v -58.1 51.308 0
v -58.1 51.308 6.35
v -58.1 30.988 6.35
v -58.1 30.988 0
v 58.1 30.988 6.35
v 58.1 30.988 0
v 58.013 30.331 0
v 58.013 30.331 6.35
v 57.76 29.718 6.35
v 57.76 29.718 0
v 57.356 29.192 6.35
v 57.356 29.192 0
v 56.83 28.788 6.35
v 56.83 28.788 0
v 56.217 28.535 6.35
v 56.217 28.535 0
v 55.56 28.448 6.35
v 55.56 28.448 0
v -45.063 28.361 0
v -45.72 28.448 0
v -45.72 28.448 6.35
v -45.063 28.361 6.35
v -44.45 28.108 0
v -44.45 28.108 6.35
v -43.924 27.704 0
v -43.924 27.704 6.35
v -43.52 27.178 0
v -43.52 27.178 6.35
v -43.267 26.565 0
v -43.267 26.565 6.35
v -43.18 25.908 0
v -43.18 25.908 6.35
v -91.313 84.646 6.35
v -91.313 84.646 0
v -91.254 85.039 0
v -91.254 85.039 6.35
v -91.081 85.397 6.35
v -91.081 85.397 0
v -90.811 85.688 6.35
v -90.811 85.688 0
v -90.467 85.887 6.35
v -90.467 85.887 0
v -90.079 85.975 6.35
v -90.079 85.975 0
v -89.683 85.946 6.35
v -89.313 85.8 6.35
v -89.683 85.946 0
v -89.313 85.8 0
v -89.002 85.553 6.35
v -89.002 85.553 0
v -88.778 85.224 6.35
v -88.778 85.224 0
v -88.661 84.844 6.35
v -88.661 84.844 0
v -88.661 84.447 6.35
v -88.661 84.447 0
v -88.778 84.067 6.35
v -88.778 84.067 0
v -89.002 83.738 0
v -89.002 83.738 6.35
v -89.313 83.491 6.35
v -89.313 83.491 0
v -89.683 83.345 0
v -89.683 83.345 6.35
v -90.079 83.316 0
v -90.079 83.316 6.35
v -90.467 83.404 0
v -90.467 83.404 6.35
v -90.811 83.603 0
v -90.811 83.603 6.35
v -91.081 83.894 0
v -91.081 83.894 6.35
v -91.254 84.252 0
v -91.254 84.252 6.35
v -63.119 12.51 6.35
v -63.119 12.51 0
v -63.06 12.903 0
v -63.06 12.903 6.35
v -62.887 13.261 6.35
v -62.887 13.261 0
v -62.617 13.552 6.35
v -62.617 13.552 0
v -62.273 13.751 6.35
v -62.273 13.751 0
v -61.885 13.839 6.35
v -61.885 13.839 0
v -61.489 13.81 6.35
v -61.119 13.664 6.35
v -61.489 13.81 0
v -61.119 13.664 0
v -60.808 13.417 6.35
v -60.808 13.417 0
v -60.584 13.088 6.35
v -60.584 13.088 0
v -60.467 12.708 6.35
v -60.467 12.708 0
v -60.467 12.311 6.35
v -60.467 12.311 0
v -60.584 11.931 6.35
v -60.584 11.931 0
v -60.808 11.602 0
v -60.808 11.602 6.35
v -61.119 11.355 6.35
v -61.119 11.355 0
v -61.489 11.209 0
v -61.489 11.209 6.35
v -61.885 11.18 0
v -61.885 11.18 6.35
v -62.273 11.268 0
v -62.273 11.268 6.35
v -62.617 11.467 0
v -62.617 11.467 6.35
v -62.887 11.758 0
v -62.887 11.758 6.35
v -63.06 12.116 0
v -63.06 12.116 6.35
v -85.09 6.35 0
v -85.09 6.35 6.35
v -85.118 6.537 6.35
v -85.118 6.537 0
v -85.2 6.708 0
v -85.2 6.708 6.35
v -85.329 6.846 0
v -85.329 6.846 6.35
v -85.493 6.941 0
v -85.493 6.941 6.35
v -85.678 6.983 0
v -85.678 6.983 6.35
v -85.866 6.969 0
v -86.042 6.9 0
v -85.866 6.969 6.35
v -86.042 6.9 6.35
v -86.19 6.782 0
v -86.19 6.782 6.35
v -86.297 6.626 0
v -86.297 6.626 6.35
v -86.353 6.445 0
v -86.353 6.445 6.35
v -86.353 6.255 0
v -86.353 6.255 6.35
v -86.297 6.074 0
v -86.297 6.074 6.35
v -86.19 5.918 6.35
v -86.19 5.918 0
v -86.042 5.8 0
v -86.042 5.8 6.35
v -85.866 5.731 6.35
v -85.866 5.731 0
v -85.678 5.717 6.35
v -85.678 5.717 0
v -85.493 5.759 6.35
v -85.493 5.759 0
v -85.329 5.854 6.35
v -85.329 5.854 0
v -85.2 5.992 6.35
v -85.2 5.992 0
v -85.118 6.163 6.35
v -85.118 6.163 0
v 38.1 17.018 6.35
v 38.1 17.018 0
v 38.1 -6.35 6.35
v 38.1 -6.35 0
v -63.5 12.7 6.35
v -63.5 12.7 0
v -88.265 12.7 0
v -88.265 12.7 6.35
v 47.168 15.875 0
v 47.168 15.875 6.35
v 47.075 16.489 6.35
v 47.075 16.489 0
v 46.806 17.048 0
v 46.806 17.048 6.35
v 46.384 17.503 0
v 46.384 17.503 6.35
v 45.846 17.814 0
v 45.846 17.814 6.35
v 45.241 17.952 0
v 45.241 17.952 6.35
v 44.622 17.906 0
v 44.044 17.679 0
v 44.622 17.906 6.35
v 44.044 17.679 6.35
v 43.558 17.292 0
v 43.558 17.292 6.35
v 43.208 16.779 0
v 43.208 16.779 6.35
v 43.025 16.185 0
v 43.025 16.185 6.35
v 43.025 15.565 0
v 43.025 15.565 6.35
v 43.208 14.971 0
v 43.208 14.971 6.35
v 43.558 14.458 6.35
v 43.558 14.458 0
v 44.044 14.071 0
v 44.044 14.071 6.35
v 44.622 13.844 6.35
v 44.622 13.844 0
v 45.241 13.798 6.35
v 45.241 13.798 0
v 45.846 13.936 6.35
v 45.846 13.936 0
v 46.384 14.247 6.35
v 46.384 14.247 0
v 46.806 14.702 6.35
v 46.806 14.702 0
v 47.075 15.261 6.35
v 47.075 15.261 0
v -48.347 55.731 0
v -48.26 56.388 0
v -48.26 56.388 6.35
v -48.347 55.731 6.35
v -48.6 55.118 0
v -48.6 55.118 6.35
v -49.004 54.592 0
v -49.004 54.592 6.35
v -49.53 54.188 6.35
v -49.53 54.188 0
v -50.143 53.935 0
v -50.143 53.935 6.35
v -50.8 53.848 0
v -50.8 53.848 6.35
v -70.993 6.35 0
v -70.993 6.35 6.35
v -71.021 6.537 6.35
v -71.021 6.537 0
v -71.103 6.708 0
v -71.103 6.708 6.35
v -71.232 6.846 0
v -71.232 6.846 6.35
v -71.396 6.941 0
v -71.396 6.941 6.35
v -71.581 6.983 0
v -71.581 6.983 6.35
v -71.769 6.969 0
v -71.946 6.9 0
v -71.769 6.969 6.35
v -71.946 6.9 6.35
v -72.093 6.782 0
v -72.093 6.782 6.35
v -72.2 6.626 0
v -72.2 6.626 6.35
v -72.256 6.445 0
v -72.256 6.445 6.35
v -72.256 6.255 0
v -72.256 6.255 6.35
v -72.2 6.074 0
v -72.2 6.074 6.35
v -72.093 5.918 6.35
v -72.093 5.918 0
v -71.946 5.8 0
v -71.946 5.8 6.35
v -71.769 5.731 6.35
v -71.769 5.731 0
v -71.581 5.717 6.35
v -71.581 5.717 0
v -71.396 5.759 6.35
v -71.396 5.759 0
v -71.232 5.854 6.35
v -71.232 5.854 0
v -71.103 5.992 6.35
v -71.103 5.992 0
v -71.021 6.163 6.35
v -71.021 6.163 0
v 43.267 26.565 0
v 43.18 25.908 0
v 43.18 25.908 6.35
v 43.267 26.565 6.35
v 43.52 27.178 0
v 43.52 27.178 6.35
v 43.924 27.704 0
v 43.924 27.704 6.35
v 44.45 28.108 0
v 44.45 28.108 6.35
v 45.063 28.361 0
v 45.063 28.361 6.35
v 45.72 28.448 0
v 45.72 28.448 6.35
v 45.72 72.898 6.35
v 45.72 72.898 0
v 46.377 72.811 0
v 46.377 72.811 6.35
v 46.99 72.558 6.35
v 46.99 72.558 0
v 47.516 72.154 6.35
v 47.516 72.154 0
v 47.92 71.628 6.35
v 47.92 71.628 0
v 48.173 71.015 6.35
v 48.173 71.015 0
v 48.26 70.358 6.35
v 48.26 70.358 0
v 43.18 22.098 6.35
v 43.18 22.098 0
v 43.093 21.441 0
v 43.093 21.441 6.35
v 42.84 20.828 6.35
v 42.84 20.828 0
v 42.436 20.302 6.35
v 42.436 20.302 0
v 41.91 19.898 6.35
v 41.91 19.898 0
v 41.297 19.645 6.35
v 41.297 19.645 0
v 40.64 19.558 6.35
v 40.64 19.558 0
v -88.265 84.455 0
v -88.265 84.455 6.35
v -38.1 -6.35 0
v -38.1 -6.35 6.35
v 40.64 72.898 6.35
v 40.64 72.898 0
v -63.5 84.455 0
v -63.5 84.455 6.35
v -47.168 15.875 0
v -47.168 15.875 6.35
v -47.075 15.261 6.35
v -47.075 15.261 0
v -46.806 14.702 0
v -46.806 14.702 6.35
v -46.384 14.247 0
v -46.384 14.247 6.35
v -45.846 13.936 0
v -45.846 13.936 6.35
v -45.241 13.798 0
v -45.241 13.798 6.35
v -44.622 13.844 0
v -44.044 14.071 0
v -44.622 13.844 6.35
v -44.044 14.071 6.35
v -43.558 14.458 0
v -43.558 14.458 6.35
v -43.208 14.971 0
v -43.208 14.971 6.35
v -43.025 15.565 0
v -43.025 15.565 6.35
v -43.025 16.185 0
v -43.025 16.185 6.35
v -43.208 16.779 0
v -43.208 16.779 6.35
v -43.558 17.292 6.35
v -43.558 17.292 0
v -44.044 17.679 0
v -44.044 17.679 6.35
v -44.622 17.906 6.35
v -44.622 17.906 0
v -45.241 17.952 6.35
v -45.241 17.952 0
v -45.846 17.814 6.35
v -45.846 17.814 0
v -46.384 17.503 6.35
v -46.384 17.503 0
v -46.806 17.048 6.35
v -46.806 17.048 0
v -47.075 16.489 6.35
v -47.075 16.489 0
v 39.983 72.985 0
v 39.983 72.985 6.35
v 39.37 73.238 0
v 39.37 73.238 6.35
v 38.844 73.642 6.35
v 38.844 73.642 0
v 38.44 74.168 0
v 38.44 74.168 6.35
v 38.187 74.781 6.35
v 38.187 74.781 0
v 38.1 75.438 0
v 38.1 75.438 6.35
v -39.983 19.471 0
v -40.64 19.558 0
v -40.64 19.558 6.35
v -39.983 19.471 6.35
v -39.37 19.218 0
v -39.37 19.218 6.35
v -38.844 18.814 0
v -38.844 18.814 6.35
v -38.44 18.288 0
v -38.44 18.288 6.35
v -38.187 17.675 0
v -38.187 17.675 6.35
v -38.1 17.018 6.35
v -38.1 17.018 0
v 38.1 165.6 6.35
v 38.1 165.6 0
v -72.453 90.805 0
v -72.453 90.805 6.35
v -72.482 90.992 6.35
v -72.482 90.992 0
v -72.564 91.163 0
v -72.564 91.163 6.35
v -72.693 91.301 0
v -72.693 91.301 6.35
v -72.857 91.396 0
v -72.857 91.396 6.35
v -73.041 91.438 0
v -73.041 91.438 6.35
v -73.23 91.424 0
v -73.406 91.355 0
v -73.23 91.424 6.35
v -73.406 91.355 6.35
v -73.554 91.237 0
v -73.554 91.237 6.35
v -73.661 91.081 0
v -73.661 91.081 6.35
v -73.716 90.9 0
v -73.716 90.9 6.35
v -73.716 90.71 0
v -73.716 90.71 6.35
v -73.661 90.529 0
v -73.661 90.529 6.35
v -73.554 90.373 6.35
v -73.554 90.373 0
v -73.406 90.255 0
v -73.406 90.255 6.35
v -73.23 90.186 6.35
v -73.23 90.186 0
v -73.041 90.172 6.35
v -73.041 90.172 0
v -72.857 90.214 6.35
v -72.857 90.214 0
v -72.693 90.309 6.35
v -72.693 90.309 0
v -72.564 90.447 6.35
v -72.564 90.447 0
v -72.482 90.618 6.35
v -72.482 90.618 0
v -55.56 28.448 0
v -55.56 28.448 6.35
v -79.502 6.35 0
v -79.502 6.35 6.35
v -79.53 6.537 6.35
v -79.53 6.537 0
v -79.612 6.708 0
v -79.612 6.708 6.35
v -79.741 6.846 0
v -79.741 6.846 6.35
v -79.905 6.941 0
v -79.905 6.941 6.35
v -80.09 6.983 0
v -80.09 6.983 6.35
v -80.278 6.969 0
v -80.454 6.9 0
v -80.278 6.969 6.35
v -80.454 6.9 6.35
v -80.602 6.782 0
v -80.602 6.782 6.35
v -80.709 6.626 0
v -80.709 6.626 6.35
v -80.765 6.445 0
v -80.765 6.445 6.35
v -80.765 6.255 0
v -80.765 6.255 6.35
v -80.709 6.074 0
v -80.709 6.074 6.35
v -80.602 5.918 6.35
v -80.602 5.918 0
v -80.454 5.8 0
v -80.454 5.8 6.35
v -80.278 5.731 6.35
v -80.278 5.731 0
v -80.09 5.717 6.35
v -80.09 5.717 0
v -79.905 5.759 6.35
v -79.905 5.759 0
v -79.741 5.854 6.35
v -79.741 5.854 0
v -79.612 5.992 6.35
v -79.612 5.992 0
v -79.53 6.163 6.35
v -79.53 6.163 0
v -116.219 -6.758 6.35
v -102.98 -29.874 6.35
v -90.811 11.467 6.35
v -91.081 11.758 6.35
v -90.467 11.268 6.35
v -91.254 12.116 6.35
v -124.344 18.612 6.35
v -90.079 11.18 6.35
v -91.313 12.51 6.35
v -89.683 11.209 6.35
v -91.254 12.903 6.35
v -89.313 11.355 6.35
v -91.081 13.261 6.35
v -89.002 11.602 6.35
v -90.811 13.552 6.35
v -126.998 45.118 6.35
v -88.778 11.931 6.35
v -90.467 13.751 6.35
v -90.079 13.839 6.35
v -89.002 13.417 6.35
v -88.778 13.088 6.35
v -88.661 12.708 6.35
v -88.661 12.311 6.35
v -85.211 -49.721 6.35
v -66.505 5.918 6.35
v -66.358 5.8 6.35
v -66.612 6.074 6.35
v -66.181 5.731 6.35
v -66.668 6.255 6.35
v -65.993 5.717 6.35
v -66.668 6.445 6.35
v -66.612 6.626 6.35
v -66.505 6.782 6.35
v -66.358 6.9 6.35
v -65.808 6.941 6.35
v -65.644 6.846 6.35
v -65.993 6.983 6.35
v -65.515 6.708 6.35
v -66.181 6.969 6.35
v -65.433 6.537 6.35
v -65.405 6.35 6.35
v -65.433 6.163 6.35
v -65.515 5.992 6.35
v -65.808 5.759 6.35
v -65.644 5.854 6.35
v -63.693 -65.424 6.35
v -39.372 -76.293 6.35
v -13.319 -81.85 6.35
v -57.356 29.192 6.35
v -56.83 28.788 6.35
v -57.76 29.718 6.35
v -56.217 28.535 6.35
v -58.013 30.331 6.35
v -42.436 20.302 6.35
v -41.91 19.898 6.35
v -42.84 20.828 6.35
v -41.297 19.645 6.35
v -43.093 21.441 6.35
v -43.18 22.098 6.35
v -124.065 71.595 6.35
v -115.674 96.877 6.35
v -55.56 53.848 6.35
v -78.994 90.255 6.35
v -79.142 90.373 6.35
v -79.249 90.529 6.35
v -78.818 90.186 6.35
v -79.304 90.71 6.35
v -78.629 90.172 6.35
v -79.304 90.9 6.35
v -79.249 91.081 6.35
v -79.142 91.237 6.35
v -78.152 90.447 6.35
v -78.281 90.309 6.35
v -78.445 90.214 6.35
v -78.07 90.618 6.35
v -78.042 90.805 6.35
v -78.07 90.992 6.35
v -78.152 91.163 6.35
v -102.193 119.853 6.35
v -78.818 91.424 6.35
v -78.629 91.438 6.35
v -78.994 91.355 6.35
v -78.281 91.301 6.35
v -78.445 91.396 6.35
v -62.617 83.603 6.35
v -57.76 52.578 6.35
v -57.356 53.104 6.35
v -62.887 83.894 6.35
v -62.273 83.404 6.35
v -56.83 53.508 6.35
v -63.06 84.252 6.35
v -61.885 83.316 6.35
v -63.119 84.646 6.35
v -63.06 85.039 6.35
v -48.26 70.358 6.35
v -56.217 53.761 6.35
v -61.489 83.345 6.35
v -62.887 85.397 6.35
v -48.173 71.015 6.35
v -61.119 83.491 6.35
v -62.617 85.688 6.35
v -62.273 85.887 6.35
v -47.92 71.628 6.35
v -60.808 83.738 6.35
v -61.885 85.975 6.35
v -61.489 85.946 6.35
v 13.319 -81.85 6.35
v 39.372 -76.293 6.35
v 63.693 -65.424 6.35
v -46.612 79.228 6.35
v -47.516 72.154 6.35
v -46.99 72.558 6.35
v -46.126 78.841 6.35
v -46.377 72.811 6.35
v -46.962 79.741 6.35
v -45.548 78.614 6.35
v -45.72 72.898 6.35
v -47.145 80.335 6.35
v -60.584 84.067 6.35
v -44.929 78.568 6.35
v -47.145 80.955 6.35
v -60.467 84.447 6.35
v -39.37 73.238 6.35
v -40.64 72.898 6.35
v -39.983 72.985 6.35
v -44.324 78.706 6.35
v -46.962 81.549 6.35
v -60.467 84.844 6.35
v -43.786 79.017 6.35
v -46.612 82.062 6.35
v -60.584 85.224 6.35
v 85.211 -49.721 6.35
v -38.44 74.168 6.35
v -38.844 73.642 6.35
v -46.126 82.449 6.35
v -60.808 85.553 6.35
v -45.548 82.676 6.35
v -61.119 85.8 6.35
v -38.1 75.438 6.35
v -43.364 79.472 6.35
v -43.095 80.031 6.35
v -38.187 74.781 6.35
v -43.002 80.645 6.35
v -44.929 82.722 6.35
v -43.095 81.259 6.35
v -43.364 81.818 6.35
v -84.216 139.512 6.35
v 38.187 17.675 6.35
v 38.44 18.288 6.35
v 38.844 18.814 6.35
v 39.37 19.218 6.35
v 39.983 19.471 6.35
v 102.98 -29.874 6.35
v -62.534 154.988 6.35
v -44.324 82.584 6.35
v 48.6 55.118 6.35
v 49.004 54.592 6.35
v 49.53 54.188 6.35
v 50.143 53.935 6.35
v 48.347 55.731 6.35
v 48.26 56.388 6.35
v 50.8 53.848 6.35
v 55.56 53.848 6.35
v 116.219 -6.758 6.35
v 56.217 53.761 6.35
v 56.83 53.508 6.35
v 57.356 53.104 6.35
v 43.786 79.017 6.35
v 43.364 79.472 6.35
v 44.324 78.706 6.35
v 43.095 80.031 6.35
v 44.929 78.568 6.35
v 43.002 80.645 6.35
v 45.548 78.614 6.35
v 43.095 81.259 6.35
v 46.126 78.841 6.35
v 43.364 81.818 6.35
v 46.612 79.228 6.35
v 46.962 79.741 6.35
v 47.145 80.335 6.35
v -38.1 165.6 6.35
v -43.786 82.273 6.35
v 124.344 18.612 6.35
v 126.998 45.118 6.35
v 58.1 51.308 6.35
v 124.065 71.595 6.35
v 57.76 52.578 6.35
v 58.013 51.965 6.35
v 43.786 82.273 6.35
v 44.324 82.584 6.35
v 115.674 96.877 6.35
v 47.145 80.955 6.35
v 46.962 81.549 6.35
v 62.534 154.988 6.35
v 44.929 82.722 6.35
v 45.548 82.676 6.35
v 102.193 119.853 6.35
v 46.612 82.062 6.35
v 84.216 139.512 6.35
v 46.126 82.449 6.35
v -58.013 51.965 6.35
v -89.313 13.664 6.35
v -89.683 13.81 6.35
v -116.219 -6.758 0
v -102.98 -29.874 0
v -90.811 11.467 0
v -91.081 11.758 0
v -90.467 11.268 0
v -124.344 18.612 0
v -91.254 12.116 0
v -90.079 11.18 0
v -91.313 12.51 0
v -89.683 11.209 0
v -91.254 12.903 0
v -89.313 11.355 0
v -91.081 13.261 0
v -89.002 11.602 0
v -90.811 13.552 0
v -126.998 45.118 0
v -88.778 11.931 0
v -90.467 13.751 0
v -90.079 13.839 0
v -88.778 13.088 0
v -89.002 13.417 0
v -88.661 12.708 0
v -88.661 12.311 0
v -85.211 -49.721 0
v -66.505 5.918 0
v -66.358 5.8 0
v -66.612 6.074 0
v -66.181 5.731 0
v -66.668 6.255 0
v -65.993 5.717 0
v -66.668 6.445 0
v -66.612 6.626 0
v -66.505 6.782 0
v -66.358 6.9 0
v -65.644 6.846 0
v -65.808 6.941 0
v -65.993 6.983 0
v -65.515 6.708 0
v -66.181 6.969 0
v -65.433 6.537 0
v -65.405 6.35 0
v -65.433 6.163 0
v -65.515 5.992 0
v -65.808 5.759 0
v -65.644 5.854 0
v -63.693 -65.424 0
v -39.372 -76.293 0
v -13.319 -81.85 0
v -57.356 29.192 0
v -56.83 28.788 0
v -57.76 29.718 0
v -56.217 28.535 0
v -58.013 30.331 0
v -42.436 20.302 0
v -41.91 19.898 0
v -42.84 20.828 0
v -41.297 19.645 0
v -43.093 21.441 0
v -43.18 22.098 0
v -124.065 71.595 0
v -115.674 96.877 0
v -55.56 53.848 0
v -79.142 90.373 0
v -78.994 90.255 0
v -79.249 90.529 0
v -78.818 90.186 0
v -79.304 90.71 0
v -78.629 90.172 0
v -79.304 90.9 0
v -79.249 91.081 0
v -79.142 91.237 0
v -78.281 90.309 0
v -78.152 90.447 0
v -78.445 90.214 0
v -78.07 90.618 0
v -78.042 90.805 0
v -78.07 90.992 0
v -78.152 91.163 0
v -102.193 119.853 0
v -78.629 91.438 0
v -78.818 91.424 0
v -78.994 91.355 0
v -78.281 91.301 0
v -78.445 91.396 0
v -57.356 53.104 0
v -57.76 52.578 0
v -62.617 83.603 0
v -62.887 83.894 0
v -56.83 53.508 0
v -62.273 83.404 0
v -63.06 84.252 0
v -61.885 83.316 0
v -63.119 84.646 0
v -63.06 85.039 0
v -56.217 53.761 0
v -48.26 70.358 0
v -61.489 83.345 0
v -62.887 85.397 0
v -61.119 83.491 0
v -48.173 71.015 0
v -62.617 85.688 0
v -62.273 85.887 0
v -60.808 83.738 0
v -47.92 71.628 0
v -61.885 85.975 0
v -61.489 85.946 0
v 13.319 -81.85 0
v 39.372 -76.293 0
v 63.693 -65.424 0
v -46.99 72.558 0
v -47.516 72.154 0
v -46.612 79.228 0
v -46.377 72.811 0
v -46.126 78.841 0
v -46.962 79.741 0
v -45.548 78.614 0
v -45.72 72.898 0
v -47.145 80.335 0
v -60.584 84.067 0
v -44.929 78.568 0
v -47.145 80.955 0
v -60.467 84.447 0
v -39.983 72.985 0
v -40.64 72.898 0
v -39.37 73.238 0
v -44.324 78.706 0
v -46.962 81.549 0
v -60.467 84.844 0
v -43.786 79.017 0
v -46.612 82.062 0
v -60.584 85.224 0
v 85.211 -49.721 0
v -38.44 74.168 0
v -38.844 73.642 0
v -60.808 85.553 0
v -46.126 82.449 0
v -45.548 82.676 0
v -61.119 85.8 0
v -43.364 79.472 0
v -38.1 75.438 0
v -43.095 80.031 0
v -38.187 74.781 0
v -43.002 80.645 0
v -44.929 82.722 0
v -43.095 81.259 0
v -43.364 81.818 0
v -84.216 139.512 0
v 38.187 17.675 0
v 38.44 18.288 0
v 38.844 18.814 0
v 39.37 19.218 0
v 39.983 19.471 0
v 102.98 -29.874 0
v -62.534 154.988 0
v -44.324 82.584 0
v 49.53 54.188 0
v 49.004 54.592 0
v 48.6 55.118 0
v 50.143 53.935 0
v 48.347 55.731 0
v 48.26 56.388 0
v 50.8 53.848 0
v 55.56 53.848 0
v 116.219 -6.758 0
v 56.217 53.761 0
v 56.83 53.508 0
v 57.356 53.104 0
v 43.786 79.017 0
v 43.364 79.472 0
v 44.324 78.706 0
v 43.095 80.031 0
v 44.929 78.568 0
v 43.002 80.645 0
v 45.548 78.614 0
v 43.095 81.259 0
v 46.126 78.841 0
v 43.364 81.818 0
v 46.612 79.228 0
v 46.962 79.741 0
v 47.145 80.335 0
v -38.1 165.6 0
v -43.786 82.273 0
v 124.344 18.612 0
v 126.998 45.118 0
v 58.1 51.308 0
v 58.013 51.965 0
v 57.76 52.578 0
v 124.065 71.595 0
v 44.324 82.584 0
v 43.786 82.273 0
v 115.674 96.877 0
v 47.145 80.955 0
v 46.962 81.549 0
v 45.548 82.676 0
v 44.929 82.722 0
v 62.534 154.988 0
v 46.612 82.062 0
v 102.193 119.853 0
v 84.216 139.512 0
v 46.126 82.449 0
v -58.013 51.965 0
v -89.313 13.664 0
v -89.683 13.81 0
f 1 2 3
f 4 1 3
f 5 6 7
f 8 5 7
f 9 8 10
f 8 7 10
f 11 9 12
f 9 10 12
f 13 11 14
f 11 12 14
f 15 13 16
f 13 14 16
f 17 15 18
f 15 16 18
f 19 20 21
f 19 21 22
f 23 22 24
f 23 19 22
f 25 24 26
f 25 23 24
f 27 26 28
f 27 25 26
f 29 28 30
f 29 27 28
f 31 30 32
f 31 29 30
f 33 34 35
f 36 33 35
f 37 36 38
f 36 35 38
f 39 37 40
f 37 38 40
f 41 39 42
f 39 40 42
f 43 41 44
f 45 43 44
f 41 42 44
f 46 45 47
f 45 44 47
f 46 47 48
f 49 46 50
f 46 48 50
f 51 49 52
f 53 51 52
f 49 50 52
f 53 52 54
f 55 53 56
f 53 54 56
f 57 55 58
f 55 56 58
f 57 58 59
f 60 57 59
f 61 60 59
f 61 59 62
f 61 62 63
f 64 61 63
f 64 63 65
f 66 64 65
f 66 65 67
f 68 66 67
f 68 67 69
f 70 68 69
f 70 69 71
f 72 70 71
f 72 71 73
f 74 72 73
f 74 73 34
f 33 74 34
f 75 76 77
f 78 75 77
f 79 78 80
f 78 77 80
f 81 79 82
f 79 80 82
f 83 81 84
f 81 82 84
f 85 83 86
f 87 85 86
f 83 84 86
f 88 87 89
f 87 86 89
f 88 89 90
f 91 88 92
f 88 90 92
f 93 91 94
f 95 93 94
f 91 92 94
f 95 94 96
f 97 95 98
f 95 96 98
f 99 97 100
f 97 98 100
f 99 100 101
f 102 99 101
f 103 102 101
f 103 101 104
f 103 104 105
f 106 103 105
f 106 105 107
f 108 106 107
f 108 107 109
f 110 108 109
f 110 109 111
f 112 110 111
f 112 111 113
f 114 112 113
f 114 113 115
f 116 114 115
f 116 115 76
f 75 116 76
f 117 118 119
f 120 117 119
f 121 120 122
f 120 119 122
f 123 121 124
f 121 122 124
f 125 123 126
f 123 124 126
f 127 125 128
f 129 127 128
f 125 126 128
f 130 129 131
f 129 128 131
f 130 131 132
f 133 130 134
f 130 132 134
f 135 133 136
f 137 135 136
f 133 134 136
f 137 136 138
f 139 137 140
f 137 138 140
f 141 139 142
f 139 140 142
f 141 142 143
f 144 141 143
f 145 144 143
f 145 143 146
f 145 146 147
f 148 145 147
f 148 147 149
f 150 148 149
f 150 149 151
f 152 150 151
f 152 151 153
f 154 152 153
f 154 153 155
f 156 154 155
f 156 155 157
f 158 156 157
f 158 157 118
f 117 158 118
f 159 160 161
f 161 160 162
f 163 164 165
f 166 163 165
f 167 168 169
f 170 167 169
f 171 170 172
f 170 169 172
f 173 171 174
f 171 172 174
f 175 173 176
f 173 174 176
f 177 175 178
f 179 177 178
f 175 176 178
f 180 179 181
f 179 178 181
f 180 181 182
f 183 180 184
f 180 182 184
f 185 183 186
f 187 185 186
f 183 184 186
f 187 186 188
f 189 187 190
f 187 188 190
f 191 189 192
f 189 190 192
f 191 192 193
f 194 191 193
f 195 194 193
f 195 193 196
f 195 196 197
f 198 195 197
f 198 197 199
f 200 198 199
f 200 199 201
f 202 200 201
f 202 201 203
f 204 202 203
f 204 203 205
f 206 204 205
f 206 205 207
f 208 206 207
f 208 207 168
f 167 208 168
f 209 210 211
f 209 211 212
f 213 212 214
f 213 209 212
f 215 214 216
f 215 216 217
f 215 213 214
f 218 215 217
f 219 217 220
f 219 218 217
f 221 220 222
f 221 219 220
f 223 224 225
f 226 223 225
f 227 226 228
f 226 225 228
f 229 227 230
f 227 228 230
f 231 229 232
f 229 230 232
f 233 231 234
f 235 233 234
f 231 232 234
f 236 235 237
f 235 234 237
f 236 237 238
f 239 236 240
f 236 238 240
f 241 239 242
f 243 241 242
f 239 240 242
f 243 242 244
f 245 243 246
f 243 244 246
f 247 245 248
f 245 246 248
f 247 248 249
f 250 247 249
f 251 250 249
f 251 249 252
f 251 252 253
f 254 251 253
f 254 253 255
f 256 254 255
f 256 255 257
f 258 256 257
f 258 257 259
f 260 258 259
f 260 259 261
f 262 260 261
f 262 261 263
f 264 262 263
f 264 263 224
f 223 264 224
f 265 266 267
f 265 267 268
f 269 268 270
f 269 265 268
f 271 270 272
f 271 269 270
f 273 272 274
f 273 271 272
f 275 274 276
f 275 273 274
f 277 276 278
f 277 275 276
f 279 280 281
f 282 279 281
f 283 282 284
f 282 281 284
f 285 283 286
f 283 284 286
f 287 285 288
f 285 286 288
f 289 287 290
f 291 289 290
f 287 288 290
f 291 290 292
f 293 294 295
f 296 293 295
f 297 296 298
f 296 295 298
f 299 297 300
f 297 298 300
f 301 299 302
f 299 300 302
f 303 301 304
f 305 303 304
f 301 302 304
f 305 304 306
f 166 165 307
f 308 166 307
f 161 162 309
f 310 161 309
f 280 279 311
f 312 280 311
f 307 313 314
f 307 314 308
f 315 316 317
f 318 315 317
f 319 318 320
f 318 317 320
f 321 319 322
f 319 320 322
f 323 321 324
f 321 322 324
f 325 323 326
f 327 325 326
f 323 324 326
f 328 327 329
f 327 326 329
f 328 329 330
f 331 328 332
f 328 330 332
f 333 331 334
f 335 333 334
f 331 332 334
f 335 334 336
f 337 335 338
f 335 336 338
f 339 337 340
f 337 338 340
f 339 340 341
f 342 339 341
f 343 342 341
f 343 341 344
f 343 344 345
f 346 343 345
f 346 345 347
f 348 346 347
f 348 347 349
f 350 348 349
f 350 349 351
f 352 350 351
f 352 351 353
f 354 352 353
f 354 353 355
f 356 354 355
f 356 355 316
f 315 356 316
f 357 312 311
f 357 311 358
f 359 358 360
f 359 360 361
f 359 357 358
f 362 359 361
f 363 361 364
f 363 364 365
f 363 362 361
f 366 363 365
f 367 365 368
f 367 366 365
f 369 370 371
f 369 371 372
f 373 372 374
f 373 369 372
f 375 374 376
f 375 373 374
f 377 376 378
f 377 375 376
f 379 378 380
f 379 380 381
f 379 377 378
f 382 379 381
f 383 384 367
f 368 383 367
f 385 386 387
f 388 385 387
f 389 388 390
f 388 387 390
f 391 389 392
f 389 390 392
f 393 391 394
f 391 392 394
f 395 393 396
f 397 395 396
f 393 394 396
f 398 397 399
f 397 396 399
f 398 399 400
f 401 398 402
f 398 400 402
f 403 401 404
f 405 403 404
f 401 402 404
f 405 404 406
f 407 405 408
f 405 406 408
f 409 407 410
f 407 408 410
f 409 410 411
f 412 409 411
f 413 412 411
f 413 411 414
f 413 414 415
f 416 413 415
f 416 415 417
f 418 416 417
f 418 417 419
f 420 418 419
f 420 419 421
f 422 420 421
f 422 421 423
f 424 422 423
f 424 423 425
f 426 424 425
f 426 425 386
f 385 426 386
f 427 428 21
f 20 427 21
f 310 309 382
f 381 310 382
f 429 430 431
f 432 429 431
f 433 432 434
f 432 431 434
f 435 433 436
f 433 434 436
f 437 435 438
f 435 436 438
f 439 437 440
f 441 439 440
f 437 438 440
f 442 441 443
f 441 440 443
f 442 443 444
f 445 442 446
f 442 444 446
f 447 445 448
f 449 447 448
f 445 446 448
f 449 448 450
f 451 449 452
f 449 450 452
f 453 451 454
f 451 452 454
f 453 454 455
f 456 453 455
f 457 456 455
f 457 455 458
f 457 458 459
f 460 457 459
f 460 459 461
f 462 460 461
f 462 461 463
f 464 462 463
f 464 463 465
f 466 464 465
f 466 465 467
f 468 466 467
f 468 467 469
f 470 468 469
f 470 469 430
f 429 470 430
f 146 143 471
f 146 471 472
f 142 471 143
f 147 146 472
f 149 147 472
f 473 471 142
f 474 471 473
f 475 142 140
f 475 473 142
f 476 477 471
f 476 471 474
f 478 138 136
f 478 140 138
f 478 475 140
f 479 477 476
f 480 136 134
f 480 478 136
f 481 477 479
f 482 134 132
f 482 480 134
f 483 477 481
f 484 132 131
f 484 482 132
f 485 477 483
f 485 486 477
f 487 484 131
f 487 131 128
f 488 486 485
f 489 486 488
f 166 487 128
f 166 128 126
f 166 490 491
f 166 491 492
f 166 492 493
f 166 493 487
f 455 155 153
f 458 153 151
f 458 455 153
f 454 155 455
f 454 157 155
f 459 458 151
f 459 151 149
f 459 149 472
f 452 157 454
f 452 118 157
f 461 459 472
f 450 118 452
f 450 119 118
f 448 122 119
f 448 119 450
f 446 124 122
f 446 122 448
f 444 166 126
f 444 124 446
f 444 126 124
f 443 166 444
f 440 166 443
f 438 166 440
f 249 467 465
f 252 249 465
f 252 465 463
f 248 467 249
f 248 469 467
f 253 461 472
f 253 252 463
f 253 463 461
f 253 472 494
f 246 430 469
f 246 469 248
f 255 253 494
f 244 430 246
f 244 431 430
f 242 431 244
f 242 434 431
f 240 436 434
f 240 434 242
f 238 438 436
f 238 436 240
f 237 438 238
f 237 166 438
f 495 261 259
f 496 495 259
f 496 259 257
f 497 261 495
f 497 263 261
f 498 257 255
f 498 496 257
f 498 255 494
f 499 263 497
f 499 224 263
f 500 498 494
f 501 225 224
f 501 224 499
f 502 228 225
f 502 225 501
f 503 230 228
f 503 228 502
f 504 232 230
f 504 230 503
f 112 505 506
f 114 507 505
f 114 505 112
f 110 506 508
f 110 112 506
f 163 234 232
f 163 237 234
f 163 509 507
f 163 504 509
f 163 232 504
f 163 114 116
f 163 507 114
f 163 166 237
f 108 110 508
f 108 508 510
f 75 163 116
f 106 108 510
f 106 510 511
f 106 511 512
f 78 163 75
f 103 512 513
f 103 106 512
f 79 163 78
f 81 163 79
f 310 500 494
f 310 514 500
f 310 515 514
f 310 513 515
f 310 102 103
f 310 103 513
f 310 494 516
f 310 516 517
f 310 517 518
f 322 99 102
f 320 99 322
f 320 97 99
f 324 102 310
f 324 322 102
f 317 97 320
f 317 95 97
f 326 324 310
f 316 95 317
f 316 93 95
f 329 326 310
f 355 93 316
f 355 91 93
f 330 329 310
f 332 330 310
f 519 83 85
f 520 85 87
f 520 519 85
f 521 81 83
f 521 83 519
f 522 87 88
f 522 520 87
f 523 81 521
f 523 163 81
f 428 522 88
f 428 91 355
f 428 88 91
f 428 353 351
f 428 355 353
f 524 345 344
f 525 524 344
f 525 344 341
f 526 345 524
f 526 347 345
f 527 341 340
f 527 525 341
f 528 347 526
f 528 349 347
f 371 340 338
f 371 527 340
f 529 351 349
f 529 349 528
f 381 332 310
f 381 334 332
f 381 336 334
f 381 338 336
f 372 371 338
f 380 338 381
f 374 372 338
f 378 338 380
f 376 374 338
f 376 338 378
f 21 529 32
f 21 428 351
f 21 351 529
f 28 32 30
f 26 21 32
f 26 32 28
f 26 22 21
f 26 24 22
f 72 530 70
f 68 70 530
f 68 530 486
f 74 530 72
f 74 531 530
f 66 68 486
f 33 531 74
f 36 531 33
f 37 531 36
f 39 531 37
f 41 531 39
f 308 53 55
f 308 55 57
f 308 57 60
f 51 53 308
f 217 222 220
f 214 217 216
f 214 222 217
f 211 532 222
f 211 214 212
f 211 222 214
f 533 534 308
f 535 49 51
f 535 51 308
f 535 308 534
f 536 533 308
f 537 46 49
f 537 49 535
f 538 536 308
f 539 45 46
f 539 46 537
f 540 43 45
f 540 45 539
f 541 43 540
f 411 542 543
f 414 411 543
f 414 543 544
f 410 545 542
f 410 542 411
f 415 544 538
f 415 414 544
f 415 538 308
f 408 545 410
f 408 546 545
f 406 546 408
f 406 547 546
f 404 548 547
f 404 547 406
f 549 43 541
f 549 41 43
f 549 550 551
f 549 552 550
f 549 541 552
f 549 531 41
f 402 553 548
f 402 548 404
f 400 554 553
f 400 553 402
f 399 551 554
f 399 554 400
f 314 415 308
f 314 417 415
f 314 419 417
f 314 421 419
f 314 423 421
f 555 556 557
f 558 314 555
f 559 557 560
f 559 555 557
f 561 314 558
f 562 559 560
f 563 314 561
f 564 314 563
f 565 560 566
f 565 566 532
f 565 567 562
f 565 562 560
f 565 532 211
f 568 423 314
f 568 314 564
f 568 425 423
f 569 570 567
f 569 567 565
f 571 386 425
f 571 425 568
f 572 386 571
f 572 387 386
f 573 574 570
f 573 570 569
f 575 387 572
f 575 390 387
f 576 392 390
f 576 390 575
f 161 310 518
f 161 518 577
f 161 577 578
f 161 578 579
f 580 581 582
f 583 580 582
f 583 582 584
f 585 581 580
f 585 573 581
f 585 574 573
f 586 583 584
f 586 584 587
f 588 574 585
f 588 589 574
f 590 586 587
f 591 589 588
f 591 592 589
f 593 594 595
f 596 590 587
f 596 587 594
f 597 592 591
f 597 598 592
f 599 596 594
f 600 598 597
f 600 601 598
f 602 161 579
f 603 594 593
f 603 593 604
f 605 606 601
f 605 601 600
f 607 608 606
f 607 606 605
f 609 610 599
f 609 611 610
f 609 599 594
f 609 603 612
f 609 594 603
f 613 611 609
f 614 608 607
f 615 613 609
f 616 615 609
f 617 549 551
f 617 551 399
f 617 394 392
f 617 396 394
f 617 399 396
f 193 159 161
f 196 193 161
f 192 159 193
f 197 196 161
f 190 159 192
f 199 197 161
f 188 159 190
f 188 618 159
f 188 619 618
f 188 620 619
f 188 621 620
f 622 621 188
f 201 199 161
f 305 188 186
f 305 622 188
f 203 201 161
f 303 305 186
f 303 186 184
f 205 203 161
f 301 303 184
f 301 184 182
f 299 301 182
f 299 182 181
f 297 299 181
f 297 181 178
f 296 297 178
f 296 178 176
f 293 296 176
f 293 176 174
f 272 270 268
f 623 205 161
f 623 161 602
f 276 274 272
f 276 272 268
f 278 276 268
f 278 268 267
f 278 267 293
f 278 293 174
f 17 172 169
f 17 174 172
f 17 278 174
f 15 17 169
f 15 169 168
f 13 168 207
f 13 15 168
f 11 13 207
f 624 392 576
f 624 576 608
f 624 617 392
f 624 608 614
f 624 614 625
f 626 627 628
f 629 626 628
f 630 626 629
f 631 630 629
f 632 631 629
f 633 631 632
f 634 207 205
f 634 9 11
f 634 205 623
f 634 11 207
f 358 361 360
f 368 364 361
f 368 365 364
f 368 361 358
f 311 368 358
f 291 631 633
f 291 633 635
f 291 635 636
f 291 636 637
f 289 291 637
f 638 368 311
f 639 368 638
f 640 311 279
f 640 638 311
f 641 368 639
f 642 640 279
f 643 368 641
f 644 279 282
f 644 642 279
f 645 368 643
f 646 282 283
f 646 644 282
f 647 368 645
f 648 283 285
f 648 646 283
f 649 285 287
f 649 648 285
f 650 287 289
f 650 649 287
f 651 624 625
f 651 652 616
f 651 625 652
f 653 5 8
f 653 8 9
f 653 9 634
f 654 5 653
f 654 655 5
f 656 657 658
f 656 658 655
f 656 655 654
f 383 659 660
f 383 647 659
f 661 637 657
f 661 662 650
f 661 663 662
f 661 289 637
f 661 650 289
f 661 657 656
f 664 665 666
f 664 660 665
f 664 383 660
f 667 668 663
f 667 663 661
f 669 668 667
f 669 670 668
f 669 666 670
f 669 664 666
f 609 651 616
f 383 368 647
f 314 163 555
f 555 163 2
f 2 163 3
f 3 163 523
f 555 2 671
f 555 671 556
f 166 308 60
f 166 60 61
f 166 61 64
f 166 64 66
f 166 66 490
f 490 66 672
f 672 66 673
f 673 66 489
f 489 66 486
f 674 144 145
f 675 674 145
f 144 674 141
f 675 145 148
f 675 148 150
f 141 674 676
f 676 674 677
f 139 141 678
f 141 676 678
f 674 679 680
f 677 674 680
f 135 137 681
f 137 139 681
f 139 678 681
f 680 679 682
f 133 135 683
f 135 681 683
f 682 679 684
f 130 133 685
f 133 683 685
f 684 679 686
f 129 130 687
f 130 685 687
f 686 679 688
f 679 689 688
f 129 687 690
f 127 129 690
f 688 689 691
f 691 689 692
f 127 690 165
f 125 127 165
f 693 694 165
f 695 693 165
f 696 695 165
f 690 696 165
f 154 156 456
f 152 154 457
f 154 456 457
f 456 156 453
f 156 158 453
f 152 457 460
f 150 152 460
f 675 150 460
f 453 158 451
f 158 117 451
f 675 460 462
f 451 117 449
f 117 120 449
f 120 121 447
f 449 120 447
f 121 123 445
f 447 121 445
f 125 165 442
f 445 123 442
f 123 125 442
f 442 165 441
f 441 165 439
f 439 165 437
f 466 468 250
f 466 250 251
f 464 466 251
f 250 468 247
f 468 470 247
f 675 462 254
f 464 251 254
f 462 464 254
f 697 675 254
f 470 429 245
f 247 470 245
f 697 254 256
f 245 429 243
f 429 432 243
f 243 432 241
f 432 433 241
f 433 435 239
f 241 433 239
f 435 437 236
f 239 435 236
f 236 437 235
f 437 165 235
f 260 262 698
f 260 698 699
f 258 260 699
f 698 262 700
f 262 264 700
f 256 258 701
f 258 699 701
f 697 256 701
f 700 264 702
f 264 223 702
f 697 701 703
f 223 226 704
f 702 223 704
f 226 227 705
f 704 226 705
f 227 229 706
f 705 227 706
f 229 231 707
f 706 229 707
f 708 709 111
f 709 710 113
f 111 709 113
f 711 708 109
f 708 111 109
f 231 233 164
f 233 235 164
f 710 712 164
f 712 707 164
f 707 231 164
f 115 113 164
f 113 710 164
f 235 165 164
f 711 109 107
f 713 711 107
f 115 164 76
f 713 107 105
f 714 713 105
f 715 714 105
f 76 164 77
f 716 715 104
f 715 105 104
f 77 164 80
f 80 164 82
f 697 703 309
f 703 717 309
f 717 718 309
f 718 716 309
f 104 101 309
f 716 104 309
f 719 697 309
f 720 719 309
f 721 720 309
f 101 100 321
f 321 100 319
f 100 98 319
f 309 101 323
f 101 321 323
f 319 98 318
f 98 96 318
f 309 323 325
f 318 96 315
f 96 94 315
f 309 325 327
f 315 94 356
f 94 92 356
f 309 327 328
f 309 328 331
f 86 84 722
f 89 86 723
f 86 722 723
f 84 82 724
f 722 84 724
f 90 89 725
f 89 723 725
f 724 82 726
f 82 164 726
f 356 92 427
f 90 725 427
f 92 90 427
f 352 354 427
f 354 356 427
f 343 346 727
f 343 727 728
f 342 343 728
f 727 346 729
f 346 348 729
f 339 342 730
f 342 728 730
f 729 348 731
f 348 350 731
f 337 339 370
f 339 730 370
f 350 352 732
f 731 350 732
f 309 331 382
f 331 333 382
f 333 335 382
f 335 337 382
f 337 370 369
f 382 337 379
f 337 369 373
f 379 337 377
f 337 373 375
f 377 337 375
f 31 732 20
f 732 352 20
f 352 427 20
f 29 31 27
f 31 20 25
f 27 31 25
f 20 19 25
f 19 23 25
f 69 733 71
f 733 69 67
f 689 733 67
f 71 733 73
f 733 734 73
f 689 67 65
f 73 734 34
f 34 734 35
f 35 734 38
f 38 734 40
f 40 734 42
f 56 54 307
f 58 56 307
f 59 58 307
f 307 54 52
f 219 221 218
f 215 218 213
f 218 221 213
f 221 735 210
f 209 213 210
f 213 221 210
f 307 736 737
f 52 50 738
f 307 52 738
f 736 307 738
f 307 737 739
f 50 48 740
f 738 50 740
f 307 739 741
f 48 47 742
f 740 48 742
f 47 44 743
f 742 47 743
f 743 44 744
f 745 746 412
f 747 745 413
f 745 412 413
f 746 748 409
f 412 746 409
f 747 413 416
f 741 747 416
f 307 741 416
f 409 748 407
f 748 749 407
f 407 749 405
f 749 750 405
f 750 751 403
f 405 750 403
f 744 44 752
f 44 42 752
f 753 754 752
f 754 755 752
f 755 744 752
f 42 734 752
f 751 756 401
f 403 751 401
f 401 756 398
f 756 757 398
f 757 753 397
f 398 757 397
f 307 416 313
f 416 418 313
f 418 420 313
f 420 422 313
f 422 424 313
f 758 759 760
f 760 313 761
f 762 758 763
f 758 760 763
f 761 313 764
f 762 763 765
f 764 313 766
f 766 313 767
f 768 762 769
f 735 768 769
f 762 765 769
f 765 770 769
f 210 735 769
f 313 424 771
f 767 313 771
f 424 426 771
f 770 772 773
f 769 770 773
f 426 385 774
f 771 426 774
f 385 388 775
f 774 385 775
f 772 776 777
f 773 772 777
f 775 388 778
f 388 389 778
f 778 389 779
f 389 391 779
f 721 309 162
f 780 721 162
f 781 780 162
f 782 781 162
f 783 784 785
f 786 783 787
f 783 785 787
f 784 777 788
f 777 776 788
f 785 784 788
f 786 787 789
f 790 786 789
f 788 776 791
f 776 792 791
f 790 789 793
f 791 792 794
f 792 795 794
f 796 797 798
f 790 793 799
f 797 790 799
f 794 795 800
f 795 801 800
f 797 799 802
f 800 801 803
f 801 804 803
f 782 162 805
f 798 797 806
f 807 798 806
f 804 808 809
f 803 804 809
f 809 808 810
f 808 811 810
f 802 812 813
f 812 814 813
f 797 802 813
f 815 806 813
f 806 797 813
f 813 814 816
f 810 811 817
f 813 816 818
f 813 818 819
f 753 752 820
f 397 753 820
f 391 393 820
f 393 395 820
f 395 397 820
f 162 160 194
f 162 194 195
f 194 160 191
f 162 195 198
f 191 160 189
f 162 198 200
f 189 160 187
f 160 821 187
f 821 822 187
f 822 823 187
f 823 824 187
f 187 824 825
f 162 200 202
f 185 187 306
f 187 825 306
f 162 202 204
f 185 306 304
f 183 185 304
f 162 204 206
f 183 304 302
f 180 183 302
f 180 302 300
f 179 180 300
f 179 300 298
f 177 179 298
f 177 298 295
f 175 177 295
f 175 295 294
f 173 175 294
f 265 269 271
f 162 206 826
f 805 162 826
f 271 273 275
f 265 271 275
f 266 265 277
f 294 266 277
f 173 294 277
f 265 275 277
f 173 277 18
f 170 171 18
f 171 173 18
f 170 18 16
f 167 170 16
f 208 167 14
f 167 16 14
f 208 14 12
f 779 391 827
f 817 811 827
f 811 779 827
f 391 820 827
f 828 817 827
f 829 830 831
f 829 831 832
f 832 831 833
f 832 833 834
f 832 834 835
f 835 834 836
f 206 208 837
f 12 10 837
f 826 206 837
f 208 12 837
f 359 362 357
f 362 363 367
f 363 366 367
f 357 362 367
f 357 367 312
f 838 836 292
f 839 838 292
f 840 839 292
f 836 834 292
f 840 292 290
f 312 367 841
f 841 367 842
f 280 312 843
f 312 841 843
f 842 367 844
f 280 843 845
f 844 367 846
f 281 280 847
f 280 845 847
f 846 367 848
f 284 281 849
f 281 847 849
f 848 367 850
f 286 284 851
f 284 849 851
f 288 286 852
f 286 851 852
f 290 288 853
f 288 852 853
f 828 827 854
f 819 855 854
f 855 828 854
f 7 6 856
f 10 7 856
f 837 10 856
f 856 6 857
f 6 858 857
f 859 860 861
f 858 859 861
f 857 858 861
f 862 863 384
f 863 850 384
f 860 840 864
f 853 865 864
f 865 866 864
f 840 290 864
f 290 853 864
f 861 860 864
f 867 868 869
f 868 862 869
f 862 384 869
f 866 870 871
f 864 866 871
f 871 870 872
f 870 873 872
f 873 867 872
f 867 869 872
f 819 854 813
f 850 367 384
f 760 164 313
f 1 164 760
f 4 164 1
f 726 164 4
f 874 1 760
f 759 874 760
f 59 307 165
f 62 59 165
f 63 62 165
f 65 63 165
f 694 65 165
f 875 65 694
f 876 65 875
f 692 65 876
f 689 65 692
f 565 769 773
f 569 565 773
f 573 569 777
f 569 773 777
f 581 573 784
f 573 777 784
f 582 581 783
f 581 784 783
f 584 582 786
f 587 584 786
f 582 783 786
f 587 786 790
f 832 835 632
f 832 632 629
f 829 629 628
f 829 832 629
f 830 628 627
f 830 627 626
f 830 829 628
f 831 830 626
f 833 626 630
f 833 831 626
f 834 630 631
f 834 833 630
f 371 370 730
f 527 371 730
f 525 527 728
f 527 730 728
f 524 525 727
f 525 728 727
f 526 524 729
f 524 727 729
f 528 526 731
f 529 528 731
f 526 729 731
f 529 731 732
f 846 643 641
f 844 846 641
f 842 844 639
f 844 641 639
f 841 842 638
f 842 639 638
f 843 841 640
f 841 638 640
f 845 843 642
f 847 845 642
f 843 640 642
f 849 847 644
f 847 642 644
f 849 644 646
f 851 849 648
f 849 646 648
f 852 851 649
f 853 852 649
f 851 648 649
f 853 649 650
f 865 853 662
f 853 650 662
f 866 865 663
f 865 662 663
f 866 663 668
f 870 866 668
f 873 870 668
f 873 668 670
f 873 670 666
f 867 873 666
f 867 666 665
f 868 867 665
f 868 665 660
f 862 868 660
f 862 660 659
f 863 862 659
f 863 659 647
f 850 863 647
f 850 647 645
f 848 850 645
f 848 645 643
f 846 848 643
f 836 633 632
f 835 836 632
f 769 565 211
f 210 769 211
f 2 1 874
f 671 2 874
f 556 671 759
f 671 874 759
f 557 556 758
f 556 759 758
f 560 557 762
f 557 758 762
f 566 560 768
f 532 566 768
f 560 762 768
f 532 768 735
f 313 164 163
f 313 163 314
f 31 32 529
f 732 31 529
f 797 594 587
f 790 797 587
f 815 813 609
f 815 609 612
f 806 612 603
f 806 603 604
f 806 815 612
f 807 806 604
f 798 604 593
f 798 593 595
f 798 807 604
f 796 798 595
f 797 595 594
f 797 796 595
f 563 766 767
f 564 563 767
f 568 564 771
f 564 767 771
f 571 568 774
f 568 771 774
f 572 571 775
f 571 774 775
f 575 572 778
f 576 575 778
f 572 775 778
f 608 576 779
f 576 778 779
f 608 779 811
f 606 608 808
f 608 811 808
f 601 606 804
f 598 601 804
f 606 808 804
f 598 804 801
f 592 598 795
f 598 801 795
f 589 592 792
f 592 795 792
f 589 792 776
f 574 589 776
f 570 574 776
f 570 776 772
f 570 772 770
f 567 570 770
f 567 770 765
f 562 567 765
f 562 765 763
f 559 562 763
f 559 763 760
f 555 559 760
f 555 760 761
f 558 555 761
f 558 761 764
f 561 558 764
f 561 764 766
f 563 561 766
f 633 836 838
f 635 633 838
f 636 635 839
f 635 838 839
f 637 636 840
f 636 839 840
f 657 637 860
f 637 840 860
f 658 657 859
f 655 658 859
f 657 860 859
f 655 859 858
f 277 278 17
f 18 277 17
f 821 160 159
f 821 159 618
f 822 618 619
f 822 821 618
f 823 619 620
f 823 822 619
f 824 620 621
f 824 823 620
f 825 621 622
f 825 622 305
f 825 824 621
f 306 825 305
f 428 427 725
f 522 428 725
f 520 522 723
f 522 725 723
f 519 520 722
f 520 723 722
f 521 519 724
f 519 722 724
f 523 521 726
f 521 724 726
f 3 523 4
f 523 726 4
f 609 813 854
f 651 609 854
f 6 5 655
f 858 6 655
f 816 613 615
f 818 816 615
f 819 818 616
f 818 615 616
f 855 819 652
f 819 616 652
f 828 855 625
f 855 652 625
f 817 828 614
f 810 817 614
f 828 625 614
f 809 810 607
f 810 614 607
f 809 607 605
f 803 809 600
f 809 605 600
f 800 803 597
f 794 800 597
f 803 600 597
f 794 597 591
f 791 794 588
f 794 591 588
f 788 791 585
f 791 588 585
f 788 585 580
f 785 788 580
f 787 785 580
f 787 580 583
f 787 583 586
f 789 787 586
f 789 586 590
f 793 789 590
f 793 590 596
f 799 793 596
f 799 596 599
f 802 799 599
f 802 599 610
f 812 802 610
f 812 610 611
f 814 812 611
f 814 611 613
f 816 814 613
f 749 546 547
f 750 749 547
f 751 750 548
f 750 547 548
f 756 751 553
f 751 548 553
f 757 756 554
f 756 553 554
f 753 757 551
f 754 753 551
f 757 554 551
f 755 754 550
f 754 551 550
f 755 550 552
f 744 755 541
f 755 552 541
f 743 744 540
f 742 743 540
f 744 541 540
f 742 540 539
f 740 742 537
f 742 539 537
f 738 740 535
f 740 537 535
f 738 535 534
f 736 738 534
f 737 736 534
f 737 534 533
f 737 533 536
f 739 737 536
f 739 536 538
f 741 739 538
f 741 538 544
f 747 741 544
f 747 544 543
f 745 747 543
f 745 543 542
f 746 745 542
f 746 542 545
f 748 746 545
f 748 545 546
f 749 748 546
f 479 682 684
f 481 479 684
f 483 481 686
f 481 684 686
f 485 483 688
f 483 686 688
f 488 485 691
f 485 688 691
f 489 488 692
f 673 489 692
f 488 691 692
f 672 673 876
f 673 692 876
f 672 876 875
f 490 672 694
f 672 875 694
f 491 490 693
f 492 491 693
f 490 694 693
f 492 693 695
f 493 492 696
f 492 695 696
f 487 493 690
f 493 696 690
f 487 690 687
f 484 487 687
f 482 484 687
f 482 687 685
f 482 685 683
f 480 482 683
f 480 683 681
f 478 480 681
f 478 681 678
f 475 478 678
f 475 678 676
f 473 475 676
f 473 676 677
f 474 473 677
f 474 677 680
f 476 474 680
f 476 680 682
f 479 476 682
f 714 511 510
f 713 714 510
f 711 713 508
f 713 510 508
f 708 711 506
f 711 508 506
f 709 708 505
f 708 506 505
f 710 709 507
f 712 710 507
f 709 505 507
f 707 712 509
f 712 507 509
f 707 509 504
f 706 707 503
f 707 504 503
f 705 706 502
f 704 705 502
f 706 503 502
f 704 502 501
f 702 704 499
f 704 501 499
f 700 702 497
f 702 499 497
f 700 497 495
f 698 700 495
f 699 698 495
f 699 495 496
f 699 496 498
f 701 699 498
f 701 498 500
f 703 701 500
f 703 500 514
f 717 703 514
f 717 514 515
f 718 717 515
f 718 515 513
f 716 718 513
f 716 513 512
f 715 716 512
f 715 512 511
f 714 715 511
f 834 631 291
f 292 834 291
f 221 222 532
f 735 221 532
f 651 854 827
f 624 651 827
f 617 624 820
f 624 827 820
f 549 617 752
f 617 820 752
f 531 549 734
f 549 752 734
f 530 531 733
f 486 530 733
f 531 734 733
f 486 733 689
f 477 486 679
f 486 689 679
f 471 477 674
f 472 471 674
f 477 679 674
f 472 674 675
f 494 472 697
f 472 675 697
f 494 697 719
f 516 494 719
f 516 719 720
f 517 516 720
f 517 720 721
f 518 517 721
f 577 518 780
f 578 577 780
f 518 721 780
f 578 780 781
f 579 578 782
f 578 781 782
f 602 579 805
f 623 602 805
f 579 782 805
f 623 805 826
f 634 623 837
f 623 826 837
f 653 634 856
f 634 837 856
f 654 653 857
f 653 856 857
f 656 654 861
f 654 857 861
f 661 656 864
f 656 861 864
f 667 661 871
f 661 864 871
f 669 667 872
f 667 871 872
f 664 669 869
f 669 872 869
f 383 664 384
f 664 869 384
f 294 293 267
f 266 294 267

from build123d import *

# Parameters (mm, degrees)
BOSS_EXTRUDE1_DEPTH = 6.35
CUT_EXTRUDE1_REACH  = 210.789
SKETCH2_R           = 1.3335
SKETCH2_W           = 24.765
SKETCH2_H           = 71.755
CUT_EXTRUDE2_REACH  = 210.789
SKETCH3_R           = 0.635
CUT_EXTRUDE3_DEPTH  = 209.788828163
FILLET1_START       = -1
FILLET1_DEPTH       = 8
FILLET1_2_DEPTH     = 6.35
SKETCH5_R           = 2.0828
CUT_EXTRUDE4_DEPTH  = 209.788828163


with BuildPart() as part:
    # Sketch1 → Boss-Extrude1 (new body)
    with BuildSketch(Plane.XY):
        with BuildLine():
            Line((-38.1, 92.71), (-38.1, 165.60027858))
            ThreePointArc((-38.1, 165.60027858), (0, -82.55), (38.1, 165.60027858))
            Line((38.1, 165.60027858), (38.1, 92.71))
            Line((38.1, 92.71), (38.1, -6.35))
            Line((38.1, -6.35), (-38.1, -6.35))
            Line((-38.1, -6.35), (-38.1, 92.71))
        make_face()
    extrude(amount=BOSS_EXTRUDE1_DEPTH)

    # Sketch2 → Cut-Extrude1 (cut, up to next)
    with BuildSketch(Plane(origin=(0, 0, 0), x_dir=(-1, 0, 0), z_dir=(0, 0, -1)), mode=Mode.PRIVATE) as cut_extrude1_sk1:
        with Locations((61.7855, 12.5095)):
            Circle(SKETCH2_R)
    cut_extrude1_tool1 = extrude(cut_extrude1_sk1.sketch, amount=-CUT_EXTRUDE1_REACH, mode=Mode.PRIVATE) & part.part
    # Sketch2 → Cut-Extrude1 (cut, up to next)
    with BuildSketch(Plane(origin=(0, 0, 0), x_dir=(-1, 0, 0), z_dir=(0, 0, -1)), mode=Mode.PRIVATE) as cut_extrude1_sk2:
        with Locations((61.7855, 84.6455)):
            Circle(SKETCH2_R)
    cut_extrude1_tool2 = extrude(cut_extrude1_sk2.sketch, amount=-CUT_EXTRUDE1_REACH, mode=Mode.PRIVATE) & part.part
    # Sketch2 → Cut-Extrude1 (cut, up to next)
    with BuildSketch(Plane(origin=(0, 0, 0), x_dir=(-1, 0, 0), z_dir=(0, 0, -1)), mode=Mode.PRIVATE) as cut_extrude1_sk3:
        with Locations((89.9795, 84.6455)):
            Circle(SKETCH2_R)
    cut_extrude1_tool3 = extrude(cut_extrude1_sk3.sketch, amount=-CUT_EXTRUDE1_REACH, mode=Mode.PRIVATE) & part.part
    # Sketch2 → Cut-Extrude1 (cut, up to next)
    with BuildSketch(Plane(origin=(0, 0, 0), x_dir=(-1, 0, 0), z_dir=(0, 0, -1)), mode=Mode.PRIVATE) as cut_extrude1_sk4:
        with Locations((89.9795, 12.5095)):
            Circle(SKETCH2_R)
    cut_extrude1_tool4 = extrude(cut_extrude1_sk4.sketch, amount=-CUT_EXTRUDE1_REACH, mode=Mode.PRIVATE) & part.part
    # Sketch2 → Cut-Extrude1 (cut, up to next)
    with BuildSketch(Plane(origin=(0, 0, 0), x_dir=(-1, 0, 0), z_dir=(0, 0, -1)), mode=Mode.PRIVATE) as cut_extrude1_sk5:
        with Locations((75.8825, 48.5775)):
            Rectangle(SKETCH2_W, SKETCH2_H)
    cut_extrude1_tool5 = extrude(cut_extrude1_sk5.sketch, amount=-CUT_EXTRUDE1_REACH, mode=Mode.PRIVATE) & part.part
    add(cut_extrude1_tool1.solids().sort_by_distance((-61.7855, 12.5095, 0))[0], mode=Mode.SUBTRACT)
    add(cut_extrude1_tool2.solids().sort_by_distance((-61.7855, 84.6455, 0))[0], mode=Mode.SUBTRACT)
    add(cut_extrude1_tool3.solids().sort_by_distance((-89.9795, 84.6455, 0))[0], mode=Mode.SUBTRACT)
    add(cut_extrude1_tool4.solids().sort_by_distance((-89.9795, 12.5095, 0))[0], mode=Mode.SUBTRACT)
    add(cut_extrude1_tool5.solids().sort_by_distance((-75.8825, 48.5775, 0))[0], mode=Mode.SUBTRACT)

    # Sketch3 → Cut-Extrude2 (cut, up to next)
    with BuildSketch(Plane.XY.offset(6.35), mode=Mode.PRIVATE) as cut_extrude2_sk1:
        with Locations((-66.04, 6.35)):
            Circle(SKETCH3_R)
    cut_extrude2_tool1 = extrude(cut_extrude2_sk1.sketch, amount=-CUT_EXTRUDE2_REACH, mode=Mode.PRIVATE) & part.part
    # Sketch3 → Cut-Extrude2 (cut, up to next)
    with BuildSketch(Plane.XY.offset(6.35), mode=Mode.PRIVATE) as cut_extrude2_sk2:
        with Locations((-71.628, 6.35)):
            Circle(SKETCH3_R)
    cut_extrude2_tool2 = extrude(cut_extrude2_sk2.sketch, amount=-CUT_EXTRUDE2_REACH, mode=Mode.PRIVATE) & part.part
    # Sketch3 → Cut-Extrude2 (cut, up to next)
    with BuildSketch(Plane.XY.offset(6.35), mode=Mode.PRIVATE) as cut_extrude2_sk3:
        with Locations((-80.137, 6.35)):
            Circle(SKETCH3_R)
    cut_extrude2_tool3 = extrude(cut_extrude2_sk3.sketch, amount=-CUT_EXTRUDE2_REACH, mode=Mode.PRIVATE) & part.part
    # Sketch3 → Cut-Extrude2 (cut, up to next)
    with BuildSketch(Plane.XY.offset(6.35), mode=Mode.PRIVATE) as cut_extrude2_sk4:
        with Locations((-85.725, 6.35)):
            Circle(SKETCH3_R)
    cut_extrude2_tool4 = extrude(cut_extrude2_sk4.sketch, amount=-CUT_EXTRUDE2_REACH, mode=Mode.PRIVATE) & part.part
    # Sketch3 → Cut-Extrude2 (cut, up to next)
    with BuildSketch(Plane.XY.offset(6.35), mode=Mode.PRIVATE) as cut_extrude2_sk5:
        with Locations((-73.0885, 90.805)):
            Circle(SKETCH3_R)
    cut_extrude2_tool5 = extrude(cut_extrude2_sk5.sketch, amount=-CUT_EXTRUDE2_REACH, mode=Mode.PRIVATE) & part.part
    # Sketch3 → Cut-Extrude2 (cut, up to next)
    with BuildSketch(Plane.XY.offset(6.35), mode=Mode.PRIVATE) as cut_extrude2_sk6:
        with Locations((-78.6765, 90.805)):
            Circle(SKETCH3_R)
    cut_extrude2_tool6 = extrude(cut_extrude2_sk6.sketch, amount=-CUT_EXTRUDE2_REACH, mode=Mode.PRIVATE) & part.part
    add(cut_extrude2_tool1.solids().sort_by_distance((-66.04, 6.35, 6.35))[0], mode=Mode.SUBTRACT)
    add(cut_extrude2_tool2.solids().sort_by_distance((-71.628, 6.35, 6.35))[0], mode=Mode.SUBTRACT)
    add(cut_extrude2_tool3.solids().sort_by_distance((-80.137, 6.35, 6.35))[0], mode=Mode.SUBTRACT)
    add(cut_extrude2_tool4.solids().sort_by_distance((-85.725, 6.35, 6.35))[0], mode=Mode.SUBTRACT)
    add(cut_extrude2_tool5.solids().sort_by_distance((-73.0885, 90.805, 6.35))[0], mode=Mode.SUBTRACT)
    add(cut_extrude2_tool6.solids().sort_by_distance((-78.6765, 90.805, 6.35))[0], mode=Mode.SUBTRACT)

    # Sketch4 → Cut-Extrude3 (cut, through all)
    with BuildSketch(Plane.XY.offset(6.35)):
        Polygon((-48.26, 72.898), (-48.26, 53.848), (-58.1, 53.848), (-58.1, 28.448), (-43.18, 28.448), (-43.18, 19.558), (-38.1, 19.558), (-38.1, 72.898), align=None)
        Polygon((43.18, 28.448), (58.1, 28.448), (58.1, 53.848), (48.26, 53.848), (48.26, 72.898), (38.1, 72.898), (38.1, 19.558), (43.18, 19.558), align=None)
    extrude(amount=-CUT_EXTRUDE3_DEPTH, mode=Mode.SUBTRACT)

    # Fillet1: read off the stored shape, not the designer's step
    # Fillet1 outline → Fillet1 (cut)
    with BuildSketch(Plane.XY.offset(FILLET1_START)):
        with BuildLine():
            Line((38.1, 72.898), (40.64, 72.898))
            ThreePointArc((40.64, 72.898), (38.843948776, 73.641948776), (38.1, 75.438))
            Line((38.1, 75.438), (38.1, 72.898))
        make_face()
        with BuildLine():
            Line((48.26, 53.848), (50.8, 53.848))
            ThreePointArc((50.8, 53.848), (49.003948776, 54.591948776), (48.26, 56.388))
            Line((48.26, 56.388), (48.26, 53.848))
        make_face()
        with BuildLine():
            Line((43.18, 28.448), (43.18, 25.908))
            ThreePointArc((43.18, 25.908), (43.923948776, 27.704051224), (45.72, 28.448))
            Line((45.72, 28.448), (43.18, 28.448))
        make_face()
        with BuildLine():
            ThreePointArc((38.1, 17.018), (38.843948776, 18.814051224), (40.64, 19.558))
            Line((40.64, 19.558), (38.1, 19.558))
            Line((38.1, 19.558), (38.1, 17.018))
        make_face()
        with BuildLine():
            Line((-38.1, 19.558), (-40.64, 19.558))
            ThreePointArc((-40.64, 19.558), (-38.843948776, 18.814051224), (-38.1, 17.018))
            Line((-38.1, 17.018), (-38.1, 19.558))
        make_face()
        with BuildLine():
            ThreePointArc((-38.1, 75.438), (-38.843948776, 73.641948776), (-40.64, 72.898))
            Line((-40.64, 72.898), (-38.1, 72.898))
            Line((-38.1, 72.898), (-38.1, 75.438))
        make_face()
        with BuildLine():
            ThreePointArc((-48.26, 56.388), (-49.003948776, 54.591948776), (-50.8, 53.848))
            Line((-50.8, 53.848), (-48.26, 53.848))
            Line((-48.26, 53.848), (-48.26, 56.388))
        make_face()
        with BuildLine():
            ThreePointArc((-45.72, 28.448), (-43.923948776, 27.704051224), (-43.18, 25.908))
            Line((-43.18, 25.908), (-43.18, 28.448))
            Line((-43.18, 28.448), (-45.72, 28.448))
        make_face()
    extrude(amount=FILLET1_DEPTH, mode=Mode.SUBTRACT)

    # Fillet1 2 outline → Fillet1 2 (add)
    with BuildSketch(Plane.XY):
        with BuildLine():
            Line((43.18, 19.558), (43.18, 22.098))
            ThreePointArc((43.18, 22.098), (42.436051224, 20.301948776), (40.64, 19.558))
            Line((40.64, 19.558), (43.18, 19.558))
        make_face()
        with BuildLine():
            ThreePointArc((45.72, 72.898), (47.516051224, 72.154051224), (48.26, 70.358))
            Line((48.26, 70.358), (48.26, 72.898))
            Line((48.26, 72.898), (45.72, 72.898))
        make_face()
        with BuildLine():
            ThreePointArc((55.56, 53.848), (57.356051224, 53.104051224), (58.1, 51.308))
            Line((58.1, 51.308), (58.1, 53.848))
            Line((58.1, 53.848), (55.56, 53.848))
        make_face()
        with BuildLine():
            ThreePointArc((58.1, 30.988), (57.356051224, 29.191948776), (55.56, 28.448))
            Line((55.56, 28.448), (58.1, 28.448))
            Line((58.1, 28.448), (58.1, 30.988))
        make_face()
        with BuildLine():
            Line((-43.18, 19.558), (-40.64, 19.558))
            ThreePointArc((-40.64, 19.558), (-42.436051224, 20.301948776), (-43.18, 22.098))
            Line((-43.18, 22.098), (-43.18, 19.558))
        make_face()
        with BuildLine():
            Line((-48.26, 72.898), (-48.26, 70.358))
            ThreePointArc((-48.26, 70.358), (-47.516051224, 72.154051224), (-45.72, 72.898))
            Line((-45.72, 72.898), (-48.26, 72.898))
        make_face()
        with BuildLine():
            Line((-58.1, 53.848), (-58.1, 51.308))
            ThreePointArc((-58.1, 51.308), (-57.356051224, 53.104051224), (-55.56, 53.848))
            Line((-55.56, 53.848), (-58.1, 53.848))
        make_face()
        with BuildLine():
            Line((-58.1, 28.448), (-55.56, 28.448))
            ThreePointArc((-55.56, 28.448), (-57.356051224, 29.191948776), (-58.1, 30.988))
            Line((-58.1, 30.988), (-58.1, 28.448))
        make_face()
    extrude(amount=FILLET1_2_DEPTH)

    # Sketch5 → Cut-Extrude4 (cut, through all)
    with BuildSketch(Plane.XY.offset(6.35)):
        with Locations((-45.085, 80.645)):
            Circle(SKETCH5_R)
        with Locations(Location((45.085, 80.645, 0), (0, 0, 180))):
            Circle(SKETCH5_R)
        with Locations((45.085, 15.875)):
            Circle(SKETCH5_R)
        with Locations(Location((-45.085, 15.875, 0), (0, 0, 180))):
            Circle(SKETCH5_R)
    extrude(amount=-CUT_EXTRUDE4_DEPTH, mode=Mode.SUBTRACT)


solid = part.part
